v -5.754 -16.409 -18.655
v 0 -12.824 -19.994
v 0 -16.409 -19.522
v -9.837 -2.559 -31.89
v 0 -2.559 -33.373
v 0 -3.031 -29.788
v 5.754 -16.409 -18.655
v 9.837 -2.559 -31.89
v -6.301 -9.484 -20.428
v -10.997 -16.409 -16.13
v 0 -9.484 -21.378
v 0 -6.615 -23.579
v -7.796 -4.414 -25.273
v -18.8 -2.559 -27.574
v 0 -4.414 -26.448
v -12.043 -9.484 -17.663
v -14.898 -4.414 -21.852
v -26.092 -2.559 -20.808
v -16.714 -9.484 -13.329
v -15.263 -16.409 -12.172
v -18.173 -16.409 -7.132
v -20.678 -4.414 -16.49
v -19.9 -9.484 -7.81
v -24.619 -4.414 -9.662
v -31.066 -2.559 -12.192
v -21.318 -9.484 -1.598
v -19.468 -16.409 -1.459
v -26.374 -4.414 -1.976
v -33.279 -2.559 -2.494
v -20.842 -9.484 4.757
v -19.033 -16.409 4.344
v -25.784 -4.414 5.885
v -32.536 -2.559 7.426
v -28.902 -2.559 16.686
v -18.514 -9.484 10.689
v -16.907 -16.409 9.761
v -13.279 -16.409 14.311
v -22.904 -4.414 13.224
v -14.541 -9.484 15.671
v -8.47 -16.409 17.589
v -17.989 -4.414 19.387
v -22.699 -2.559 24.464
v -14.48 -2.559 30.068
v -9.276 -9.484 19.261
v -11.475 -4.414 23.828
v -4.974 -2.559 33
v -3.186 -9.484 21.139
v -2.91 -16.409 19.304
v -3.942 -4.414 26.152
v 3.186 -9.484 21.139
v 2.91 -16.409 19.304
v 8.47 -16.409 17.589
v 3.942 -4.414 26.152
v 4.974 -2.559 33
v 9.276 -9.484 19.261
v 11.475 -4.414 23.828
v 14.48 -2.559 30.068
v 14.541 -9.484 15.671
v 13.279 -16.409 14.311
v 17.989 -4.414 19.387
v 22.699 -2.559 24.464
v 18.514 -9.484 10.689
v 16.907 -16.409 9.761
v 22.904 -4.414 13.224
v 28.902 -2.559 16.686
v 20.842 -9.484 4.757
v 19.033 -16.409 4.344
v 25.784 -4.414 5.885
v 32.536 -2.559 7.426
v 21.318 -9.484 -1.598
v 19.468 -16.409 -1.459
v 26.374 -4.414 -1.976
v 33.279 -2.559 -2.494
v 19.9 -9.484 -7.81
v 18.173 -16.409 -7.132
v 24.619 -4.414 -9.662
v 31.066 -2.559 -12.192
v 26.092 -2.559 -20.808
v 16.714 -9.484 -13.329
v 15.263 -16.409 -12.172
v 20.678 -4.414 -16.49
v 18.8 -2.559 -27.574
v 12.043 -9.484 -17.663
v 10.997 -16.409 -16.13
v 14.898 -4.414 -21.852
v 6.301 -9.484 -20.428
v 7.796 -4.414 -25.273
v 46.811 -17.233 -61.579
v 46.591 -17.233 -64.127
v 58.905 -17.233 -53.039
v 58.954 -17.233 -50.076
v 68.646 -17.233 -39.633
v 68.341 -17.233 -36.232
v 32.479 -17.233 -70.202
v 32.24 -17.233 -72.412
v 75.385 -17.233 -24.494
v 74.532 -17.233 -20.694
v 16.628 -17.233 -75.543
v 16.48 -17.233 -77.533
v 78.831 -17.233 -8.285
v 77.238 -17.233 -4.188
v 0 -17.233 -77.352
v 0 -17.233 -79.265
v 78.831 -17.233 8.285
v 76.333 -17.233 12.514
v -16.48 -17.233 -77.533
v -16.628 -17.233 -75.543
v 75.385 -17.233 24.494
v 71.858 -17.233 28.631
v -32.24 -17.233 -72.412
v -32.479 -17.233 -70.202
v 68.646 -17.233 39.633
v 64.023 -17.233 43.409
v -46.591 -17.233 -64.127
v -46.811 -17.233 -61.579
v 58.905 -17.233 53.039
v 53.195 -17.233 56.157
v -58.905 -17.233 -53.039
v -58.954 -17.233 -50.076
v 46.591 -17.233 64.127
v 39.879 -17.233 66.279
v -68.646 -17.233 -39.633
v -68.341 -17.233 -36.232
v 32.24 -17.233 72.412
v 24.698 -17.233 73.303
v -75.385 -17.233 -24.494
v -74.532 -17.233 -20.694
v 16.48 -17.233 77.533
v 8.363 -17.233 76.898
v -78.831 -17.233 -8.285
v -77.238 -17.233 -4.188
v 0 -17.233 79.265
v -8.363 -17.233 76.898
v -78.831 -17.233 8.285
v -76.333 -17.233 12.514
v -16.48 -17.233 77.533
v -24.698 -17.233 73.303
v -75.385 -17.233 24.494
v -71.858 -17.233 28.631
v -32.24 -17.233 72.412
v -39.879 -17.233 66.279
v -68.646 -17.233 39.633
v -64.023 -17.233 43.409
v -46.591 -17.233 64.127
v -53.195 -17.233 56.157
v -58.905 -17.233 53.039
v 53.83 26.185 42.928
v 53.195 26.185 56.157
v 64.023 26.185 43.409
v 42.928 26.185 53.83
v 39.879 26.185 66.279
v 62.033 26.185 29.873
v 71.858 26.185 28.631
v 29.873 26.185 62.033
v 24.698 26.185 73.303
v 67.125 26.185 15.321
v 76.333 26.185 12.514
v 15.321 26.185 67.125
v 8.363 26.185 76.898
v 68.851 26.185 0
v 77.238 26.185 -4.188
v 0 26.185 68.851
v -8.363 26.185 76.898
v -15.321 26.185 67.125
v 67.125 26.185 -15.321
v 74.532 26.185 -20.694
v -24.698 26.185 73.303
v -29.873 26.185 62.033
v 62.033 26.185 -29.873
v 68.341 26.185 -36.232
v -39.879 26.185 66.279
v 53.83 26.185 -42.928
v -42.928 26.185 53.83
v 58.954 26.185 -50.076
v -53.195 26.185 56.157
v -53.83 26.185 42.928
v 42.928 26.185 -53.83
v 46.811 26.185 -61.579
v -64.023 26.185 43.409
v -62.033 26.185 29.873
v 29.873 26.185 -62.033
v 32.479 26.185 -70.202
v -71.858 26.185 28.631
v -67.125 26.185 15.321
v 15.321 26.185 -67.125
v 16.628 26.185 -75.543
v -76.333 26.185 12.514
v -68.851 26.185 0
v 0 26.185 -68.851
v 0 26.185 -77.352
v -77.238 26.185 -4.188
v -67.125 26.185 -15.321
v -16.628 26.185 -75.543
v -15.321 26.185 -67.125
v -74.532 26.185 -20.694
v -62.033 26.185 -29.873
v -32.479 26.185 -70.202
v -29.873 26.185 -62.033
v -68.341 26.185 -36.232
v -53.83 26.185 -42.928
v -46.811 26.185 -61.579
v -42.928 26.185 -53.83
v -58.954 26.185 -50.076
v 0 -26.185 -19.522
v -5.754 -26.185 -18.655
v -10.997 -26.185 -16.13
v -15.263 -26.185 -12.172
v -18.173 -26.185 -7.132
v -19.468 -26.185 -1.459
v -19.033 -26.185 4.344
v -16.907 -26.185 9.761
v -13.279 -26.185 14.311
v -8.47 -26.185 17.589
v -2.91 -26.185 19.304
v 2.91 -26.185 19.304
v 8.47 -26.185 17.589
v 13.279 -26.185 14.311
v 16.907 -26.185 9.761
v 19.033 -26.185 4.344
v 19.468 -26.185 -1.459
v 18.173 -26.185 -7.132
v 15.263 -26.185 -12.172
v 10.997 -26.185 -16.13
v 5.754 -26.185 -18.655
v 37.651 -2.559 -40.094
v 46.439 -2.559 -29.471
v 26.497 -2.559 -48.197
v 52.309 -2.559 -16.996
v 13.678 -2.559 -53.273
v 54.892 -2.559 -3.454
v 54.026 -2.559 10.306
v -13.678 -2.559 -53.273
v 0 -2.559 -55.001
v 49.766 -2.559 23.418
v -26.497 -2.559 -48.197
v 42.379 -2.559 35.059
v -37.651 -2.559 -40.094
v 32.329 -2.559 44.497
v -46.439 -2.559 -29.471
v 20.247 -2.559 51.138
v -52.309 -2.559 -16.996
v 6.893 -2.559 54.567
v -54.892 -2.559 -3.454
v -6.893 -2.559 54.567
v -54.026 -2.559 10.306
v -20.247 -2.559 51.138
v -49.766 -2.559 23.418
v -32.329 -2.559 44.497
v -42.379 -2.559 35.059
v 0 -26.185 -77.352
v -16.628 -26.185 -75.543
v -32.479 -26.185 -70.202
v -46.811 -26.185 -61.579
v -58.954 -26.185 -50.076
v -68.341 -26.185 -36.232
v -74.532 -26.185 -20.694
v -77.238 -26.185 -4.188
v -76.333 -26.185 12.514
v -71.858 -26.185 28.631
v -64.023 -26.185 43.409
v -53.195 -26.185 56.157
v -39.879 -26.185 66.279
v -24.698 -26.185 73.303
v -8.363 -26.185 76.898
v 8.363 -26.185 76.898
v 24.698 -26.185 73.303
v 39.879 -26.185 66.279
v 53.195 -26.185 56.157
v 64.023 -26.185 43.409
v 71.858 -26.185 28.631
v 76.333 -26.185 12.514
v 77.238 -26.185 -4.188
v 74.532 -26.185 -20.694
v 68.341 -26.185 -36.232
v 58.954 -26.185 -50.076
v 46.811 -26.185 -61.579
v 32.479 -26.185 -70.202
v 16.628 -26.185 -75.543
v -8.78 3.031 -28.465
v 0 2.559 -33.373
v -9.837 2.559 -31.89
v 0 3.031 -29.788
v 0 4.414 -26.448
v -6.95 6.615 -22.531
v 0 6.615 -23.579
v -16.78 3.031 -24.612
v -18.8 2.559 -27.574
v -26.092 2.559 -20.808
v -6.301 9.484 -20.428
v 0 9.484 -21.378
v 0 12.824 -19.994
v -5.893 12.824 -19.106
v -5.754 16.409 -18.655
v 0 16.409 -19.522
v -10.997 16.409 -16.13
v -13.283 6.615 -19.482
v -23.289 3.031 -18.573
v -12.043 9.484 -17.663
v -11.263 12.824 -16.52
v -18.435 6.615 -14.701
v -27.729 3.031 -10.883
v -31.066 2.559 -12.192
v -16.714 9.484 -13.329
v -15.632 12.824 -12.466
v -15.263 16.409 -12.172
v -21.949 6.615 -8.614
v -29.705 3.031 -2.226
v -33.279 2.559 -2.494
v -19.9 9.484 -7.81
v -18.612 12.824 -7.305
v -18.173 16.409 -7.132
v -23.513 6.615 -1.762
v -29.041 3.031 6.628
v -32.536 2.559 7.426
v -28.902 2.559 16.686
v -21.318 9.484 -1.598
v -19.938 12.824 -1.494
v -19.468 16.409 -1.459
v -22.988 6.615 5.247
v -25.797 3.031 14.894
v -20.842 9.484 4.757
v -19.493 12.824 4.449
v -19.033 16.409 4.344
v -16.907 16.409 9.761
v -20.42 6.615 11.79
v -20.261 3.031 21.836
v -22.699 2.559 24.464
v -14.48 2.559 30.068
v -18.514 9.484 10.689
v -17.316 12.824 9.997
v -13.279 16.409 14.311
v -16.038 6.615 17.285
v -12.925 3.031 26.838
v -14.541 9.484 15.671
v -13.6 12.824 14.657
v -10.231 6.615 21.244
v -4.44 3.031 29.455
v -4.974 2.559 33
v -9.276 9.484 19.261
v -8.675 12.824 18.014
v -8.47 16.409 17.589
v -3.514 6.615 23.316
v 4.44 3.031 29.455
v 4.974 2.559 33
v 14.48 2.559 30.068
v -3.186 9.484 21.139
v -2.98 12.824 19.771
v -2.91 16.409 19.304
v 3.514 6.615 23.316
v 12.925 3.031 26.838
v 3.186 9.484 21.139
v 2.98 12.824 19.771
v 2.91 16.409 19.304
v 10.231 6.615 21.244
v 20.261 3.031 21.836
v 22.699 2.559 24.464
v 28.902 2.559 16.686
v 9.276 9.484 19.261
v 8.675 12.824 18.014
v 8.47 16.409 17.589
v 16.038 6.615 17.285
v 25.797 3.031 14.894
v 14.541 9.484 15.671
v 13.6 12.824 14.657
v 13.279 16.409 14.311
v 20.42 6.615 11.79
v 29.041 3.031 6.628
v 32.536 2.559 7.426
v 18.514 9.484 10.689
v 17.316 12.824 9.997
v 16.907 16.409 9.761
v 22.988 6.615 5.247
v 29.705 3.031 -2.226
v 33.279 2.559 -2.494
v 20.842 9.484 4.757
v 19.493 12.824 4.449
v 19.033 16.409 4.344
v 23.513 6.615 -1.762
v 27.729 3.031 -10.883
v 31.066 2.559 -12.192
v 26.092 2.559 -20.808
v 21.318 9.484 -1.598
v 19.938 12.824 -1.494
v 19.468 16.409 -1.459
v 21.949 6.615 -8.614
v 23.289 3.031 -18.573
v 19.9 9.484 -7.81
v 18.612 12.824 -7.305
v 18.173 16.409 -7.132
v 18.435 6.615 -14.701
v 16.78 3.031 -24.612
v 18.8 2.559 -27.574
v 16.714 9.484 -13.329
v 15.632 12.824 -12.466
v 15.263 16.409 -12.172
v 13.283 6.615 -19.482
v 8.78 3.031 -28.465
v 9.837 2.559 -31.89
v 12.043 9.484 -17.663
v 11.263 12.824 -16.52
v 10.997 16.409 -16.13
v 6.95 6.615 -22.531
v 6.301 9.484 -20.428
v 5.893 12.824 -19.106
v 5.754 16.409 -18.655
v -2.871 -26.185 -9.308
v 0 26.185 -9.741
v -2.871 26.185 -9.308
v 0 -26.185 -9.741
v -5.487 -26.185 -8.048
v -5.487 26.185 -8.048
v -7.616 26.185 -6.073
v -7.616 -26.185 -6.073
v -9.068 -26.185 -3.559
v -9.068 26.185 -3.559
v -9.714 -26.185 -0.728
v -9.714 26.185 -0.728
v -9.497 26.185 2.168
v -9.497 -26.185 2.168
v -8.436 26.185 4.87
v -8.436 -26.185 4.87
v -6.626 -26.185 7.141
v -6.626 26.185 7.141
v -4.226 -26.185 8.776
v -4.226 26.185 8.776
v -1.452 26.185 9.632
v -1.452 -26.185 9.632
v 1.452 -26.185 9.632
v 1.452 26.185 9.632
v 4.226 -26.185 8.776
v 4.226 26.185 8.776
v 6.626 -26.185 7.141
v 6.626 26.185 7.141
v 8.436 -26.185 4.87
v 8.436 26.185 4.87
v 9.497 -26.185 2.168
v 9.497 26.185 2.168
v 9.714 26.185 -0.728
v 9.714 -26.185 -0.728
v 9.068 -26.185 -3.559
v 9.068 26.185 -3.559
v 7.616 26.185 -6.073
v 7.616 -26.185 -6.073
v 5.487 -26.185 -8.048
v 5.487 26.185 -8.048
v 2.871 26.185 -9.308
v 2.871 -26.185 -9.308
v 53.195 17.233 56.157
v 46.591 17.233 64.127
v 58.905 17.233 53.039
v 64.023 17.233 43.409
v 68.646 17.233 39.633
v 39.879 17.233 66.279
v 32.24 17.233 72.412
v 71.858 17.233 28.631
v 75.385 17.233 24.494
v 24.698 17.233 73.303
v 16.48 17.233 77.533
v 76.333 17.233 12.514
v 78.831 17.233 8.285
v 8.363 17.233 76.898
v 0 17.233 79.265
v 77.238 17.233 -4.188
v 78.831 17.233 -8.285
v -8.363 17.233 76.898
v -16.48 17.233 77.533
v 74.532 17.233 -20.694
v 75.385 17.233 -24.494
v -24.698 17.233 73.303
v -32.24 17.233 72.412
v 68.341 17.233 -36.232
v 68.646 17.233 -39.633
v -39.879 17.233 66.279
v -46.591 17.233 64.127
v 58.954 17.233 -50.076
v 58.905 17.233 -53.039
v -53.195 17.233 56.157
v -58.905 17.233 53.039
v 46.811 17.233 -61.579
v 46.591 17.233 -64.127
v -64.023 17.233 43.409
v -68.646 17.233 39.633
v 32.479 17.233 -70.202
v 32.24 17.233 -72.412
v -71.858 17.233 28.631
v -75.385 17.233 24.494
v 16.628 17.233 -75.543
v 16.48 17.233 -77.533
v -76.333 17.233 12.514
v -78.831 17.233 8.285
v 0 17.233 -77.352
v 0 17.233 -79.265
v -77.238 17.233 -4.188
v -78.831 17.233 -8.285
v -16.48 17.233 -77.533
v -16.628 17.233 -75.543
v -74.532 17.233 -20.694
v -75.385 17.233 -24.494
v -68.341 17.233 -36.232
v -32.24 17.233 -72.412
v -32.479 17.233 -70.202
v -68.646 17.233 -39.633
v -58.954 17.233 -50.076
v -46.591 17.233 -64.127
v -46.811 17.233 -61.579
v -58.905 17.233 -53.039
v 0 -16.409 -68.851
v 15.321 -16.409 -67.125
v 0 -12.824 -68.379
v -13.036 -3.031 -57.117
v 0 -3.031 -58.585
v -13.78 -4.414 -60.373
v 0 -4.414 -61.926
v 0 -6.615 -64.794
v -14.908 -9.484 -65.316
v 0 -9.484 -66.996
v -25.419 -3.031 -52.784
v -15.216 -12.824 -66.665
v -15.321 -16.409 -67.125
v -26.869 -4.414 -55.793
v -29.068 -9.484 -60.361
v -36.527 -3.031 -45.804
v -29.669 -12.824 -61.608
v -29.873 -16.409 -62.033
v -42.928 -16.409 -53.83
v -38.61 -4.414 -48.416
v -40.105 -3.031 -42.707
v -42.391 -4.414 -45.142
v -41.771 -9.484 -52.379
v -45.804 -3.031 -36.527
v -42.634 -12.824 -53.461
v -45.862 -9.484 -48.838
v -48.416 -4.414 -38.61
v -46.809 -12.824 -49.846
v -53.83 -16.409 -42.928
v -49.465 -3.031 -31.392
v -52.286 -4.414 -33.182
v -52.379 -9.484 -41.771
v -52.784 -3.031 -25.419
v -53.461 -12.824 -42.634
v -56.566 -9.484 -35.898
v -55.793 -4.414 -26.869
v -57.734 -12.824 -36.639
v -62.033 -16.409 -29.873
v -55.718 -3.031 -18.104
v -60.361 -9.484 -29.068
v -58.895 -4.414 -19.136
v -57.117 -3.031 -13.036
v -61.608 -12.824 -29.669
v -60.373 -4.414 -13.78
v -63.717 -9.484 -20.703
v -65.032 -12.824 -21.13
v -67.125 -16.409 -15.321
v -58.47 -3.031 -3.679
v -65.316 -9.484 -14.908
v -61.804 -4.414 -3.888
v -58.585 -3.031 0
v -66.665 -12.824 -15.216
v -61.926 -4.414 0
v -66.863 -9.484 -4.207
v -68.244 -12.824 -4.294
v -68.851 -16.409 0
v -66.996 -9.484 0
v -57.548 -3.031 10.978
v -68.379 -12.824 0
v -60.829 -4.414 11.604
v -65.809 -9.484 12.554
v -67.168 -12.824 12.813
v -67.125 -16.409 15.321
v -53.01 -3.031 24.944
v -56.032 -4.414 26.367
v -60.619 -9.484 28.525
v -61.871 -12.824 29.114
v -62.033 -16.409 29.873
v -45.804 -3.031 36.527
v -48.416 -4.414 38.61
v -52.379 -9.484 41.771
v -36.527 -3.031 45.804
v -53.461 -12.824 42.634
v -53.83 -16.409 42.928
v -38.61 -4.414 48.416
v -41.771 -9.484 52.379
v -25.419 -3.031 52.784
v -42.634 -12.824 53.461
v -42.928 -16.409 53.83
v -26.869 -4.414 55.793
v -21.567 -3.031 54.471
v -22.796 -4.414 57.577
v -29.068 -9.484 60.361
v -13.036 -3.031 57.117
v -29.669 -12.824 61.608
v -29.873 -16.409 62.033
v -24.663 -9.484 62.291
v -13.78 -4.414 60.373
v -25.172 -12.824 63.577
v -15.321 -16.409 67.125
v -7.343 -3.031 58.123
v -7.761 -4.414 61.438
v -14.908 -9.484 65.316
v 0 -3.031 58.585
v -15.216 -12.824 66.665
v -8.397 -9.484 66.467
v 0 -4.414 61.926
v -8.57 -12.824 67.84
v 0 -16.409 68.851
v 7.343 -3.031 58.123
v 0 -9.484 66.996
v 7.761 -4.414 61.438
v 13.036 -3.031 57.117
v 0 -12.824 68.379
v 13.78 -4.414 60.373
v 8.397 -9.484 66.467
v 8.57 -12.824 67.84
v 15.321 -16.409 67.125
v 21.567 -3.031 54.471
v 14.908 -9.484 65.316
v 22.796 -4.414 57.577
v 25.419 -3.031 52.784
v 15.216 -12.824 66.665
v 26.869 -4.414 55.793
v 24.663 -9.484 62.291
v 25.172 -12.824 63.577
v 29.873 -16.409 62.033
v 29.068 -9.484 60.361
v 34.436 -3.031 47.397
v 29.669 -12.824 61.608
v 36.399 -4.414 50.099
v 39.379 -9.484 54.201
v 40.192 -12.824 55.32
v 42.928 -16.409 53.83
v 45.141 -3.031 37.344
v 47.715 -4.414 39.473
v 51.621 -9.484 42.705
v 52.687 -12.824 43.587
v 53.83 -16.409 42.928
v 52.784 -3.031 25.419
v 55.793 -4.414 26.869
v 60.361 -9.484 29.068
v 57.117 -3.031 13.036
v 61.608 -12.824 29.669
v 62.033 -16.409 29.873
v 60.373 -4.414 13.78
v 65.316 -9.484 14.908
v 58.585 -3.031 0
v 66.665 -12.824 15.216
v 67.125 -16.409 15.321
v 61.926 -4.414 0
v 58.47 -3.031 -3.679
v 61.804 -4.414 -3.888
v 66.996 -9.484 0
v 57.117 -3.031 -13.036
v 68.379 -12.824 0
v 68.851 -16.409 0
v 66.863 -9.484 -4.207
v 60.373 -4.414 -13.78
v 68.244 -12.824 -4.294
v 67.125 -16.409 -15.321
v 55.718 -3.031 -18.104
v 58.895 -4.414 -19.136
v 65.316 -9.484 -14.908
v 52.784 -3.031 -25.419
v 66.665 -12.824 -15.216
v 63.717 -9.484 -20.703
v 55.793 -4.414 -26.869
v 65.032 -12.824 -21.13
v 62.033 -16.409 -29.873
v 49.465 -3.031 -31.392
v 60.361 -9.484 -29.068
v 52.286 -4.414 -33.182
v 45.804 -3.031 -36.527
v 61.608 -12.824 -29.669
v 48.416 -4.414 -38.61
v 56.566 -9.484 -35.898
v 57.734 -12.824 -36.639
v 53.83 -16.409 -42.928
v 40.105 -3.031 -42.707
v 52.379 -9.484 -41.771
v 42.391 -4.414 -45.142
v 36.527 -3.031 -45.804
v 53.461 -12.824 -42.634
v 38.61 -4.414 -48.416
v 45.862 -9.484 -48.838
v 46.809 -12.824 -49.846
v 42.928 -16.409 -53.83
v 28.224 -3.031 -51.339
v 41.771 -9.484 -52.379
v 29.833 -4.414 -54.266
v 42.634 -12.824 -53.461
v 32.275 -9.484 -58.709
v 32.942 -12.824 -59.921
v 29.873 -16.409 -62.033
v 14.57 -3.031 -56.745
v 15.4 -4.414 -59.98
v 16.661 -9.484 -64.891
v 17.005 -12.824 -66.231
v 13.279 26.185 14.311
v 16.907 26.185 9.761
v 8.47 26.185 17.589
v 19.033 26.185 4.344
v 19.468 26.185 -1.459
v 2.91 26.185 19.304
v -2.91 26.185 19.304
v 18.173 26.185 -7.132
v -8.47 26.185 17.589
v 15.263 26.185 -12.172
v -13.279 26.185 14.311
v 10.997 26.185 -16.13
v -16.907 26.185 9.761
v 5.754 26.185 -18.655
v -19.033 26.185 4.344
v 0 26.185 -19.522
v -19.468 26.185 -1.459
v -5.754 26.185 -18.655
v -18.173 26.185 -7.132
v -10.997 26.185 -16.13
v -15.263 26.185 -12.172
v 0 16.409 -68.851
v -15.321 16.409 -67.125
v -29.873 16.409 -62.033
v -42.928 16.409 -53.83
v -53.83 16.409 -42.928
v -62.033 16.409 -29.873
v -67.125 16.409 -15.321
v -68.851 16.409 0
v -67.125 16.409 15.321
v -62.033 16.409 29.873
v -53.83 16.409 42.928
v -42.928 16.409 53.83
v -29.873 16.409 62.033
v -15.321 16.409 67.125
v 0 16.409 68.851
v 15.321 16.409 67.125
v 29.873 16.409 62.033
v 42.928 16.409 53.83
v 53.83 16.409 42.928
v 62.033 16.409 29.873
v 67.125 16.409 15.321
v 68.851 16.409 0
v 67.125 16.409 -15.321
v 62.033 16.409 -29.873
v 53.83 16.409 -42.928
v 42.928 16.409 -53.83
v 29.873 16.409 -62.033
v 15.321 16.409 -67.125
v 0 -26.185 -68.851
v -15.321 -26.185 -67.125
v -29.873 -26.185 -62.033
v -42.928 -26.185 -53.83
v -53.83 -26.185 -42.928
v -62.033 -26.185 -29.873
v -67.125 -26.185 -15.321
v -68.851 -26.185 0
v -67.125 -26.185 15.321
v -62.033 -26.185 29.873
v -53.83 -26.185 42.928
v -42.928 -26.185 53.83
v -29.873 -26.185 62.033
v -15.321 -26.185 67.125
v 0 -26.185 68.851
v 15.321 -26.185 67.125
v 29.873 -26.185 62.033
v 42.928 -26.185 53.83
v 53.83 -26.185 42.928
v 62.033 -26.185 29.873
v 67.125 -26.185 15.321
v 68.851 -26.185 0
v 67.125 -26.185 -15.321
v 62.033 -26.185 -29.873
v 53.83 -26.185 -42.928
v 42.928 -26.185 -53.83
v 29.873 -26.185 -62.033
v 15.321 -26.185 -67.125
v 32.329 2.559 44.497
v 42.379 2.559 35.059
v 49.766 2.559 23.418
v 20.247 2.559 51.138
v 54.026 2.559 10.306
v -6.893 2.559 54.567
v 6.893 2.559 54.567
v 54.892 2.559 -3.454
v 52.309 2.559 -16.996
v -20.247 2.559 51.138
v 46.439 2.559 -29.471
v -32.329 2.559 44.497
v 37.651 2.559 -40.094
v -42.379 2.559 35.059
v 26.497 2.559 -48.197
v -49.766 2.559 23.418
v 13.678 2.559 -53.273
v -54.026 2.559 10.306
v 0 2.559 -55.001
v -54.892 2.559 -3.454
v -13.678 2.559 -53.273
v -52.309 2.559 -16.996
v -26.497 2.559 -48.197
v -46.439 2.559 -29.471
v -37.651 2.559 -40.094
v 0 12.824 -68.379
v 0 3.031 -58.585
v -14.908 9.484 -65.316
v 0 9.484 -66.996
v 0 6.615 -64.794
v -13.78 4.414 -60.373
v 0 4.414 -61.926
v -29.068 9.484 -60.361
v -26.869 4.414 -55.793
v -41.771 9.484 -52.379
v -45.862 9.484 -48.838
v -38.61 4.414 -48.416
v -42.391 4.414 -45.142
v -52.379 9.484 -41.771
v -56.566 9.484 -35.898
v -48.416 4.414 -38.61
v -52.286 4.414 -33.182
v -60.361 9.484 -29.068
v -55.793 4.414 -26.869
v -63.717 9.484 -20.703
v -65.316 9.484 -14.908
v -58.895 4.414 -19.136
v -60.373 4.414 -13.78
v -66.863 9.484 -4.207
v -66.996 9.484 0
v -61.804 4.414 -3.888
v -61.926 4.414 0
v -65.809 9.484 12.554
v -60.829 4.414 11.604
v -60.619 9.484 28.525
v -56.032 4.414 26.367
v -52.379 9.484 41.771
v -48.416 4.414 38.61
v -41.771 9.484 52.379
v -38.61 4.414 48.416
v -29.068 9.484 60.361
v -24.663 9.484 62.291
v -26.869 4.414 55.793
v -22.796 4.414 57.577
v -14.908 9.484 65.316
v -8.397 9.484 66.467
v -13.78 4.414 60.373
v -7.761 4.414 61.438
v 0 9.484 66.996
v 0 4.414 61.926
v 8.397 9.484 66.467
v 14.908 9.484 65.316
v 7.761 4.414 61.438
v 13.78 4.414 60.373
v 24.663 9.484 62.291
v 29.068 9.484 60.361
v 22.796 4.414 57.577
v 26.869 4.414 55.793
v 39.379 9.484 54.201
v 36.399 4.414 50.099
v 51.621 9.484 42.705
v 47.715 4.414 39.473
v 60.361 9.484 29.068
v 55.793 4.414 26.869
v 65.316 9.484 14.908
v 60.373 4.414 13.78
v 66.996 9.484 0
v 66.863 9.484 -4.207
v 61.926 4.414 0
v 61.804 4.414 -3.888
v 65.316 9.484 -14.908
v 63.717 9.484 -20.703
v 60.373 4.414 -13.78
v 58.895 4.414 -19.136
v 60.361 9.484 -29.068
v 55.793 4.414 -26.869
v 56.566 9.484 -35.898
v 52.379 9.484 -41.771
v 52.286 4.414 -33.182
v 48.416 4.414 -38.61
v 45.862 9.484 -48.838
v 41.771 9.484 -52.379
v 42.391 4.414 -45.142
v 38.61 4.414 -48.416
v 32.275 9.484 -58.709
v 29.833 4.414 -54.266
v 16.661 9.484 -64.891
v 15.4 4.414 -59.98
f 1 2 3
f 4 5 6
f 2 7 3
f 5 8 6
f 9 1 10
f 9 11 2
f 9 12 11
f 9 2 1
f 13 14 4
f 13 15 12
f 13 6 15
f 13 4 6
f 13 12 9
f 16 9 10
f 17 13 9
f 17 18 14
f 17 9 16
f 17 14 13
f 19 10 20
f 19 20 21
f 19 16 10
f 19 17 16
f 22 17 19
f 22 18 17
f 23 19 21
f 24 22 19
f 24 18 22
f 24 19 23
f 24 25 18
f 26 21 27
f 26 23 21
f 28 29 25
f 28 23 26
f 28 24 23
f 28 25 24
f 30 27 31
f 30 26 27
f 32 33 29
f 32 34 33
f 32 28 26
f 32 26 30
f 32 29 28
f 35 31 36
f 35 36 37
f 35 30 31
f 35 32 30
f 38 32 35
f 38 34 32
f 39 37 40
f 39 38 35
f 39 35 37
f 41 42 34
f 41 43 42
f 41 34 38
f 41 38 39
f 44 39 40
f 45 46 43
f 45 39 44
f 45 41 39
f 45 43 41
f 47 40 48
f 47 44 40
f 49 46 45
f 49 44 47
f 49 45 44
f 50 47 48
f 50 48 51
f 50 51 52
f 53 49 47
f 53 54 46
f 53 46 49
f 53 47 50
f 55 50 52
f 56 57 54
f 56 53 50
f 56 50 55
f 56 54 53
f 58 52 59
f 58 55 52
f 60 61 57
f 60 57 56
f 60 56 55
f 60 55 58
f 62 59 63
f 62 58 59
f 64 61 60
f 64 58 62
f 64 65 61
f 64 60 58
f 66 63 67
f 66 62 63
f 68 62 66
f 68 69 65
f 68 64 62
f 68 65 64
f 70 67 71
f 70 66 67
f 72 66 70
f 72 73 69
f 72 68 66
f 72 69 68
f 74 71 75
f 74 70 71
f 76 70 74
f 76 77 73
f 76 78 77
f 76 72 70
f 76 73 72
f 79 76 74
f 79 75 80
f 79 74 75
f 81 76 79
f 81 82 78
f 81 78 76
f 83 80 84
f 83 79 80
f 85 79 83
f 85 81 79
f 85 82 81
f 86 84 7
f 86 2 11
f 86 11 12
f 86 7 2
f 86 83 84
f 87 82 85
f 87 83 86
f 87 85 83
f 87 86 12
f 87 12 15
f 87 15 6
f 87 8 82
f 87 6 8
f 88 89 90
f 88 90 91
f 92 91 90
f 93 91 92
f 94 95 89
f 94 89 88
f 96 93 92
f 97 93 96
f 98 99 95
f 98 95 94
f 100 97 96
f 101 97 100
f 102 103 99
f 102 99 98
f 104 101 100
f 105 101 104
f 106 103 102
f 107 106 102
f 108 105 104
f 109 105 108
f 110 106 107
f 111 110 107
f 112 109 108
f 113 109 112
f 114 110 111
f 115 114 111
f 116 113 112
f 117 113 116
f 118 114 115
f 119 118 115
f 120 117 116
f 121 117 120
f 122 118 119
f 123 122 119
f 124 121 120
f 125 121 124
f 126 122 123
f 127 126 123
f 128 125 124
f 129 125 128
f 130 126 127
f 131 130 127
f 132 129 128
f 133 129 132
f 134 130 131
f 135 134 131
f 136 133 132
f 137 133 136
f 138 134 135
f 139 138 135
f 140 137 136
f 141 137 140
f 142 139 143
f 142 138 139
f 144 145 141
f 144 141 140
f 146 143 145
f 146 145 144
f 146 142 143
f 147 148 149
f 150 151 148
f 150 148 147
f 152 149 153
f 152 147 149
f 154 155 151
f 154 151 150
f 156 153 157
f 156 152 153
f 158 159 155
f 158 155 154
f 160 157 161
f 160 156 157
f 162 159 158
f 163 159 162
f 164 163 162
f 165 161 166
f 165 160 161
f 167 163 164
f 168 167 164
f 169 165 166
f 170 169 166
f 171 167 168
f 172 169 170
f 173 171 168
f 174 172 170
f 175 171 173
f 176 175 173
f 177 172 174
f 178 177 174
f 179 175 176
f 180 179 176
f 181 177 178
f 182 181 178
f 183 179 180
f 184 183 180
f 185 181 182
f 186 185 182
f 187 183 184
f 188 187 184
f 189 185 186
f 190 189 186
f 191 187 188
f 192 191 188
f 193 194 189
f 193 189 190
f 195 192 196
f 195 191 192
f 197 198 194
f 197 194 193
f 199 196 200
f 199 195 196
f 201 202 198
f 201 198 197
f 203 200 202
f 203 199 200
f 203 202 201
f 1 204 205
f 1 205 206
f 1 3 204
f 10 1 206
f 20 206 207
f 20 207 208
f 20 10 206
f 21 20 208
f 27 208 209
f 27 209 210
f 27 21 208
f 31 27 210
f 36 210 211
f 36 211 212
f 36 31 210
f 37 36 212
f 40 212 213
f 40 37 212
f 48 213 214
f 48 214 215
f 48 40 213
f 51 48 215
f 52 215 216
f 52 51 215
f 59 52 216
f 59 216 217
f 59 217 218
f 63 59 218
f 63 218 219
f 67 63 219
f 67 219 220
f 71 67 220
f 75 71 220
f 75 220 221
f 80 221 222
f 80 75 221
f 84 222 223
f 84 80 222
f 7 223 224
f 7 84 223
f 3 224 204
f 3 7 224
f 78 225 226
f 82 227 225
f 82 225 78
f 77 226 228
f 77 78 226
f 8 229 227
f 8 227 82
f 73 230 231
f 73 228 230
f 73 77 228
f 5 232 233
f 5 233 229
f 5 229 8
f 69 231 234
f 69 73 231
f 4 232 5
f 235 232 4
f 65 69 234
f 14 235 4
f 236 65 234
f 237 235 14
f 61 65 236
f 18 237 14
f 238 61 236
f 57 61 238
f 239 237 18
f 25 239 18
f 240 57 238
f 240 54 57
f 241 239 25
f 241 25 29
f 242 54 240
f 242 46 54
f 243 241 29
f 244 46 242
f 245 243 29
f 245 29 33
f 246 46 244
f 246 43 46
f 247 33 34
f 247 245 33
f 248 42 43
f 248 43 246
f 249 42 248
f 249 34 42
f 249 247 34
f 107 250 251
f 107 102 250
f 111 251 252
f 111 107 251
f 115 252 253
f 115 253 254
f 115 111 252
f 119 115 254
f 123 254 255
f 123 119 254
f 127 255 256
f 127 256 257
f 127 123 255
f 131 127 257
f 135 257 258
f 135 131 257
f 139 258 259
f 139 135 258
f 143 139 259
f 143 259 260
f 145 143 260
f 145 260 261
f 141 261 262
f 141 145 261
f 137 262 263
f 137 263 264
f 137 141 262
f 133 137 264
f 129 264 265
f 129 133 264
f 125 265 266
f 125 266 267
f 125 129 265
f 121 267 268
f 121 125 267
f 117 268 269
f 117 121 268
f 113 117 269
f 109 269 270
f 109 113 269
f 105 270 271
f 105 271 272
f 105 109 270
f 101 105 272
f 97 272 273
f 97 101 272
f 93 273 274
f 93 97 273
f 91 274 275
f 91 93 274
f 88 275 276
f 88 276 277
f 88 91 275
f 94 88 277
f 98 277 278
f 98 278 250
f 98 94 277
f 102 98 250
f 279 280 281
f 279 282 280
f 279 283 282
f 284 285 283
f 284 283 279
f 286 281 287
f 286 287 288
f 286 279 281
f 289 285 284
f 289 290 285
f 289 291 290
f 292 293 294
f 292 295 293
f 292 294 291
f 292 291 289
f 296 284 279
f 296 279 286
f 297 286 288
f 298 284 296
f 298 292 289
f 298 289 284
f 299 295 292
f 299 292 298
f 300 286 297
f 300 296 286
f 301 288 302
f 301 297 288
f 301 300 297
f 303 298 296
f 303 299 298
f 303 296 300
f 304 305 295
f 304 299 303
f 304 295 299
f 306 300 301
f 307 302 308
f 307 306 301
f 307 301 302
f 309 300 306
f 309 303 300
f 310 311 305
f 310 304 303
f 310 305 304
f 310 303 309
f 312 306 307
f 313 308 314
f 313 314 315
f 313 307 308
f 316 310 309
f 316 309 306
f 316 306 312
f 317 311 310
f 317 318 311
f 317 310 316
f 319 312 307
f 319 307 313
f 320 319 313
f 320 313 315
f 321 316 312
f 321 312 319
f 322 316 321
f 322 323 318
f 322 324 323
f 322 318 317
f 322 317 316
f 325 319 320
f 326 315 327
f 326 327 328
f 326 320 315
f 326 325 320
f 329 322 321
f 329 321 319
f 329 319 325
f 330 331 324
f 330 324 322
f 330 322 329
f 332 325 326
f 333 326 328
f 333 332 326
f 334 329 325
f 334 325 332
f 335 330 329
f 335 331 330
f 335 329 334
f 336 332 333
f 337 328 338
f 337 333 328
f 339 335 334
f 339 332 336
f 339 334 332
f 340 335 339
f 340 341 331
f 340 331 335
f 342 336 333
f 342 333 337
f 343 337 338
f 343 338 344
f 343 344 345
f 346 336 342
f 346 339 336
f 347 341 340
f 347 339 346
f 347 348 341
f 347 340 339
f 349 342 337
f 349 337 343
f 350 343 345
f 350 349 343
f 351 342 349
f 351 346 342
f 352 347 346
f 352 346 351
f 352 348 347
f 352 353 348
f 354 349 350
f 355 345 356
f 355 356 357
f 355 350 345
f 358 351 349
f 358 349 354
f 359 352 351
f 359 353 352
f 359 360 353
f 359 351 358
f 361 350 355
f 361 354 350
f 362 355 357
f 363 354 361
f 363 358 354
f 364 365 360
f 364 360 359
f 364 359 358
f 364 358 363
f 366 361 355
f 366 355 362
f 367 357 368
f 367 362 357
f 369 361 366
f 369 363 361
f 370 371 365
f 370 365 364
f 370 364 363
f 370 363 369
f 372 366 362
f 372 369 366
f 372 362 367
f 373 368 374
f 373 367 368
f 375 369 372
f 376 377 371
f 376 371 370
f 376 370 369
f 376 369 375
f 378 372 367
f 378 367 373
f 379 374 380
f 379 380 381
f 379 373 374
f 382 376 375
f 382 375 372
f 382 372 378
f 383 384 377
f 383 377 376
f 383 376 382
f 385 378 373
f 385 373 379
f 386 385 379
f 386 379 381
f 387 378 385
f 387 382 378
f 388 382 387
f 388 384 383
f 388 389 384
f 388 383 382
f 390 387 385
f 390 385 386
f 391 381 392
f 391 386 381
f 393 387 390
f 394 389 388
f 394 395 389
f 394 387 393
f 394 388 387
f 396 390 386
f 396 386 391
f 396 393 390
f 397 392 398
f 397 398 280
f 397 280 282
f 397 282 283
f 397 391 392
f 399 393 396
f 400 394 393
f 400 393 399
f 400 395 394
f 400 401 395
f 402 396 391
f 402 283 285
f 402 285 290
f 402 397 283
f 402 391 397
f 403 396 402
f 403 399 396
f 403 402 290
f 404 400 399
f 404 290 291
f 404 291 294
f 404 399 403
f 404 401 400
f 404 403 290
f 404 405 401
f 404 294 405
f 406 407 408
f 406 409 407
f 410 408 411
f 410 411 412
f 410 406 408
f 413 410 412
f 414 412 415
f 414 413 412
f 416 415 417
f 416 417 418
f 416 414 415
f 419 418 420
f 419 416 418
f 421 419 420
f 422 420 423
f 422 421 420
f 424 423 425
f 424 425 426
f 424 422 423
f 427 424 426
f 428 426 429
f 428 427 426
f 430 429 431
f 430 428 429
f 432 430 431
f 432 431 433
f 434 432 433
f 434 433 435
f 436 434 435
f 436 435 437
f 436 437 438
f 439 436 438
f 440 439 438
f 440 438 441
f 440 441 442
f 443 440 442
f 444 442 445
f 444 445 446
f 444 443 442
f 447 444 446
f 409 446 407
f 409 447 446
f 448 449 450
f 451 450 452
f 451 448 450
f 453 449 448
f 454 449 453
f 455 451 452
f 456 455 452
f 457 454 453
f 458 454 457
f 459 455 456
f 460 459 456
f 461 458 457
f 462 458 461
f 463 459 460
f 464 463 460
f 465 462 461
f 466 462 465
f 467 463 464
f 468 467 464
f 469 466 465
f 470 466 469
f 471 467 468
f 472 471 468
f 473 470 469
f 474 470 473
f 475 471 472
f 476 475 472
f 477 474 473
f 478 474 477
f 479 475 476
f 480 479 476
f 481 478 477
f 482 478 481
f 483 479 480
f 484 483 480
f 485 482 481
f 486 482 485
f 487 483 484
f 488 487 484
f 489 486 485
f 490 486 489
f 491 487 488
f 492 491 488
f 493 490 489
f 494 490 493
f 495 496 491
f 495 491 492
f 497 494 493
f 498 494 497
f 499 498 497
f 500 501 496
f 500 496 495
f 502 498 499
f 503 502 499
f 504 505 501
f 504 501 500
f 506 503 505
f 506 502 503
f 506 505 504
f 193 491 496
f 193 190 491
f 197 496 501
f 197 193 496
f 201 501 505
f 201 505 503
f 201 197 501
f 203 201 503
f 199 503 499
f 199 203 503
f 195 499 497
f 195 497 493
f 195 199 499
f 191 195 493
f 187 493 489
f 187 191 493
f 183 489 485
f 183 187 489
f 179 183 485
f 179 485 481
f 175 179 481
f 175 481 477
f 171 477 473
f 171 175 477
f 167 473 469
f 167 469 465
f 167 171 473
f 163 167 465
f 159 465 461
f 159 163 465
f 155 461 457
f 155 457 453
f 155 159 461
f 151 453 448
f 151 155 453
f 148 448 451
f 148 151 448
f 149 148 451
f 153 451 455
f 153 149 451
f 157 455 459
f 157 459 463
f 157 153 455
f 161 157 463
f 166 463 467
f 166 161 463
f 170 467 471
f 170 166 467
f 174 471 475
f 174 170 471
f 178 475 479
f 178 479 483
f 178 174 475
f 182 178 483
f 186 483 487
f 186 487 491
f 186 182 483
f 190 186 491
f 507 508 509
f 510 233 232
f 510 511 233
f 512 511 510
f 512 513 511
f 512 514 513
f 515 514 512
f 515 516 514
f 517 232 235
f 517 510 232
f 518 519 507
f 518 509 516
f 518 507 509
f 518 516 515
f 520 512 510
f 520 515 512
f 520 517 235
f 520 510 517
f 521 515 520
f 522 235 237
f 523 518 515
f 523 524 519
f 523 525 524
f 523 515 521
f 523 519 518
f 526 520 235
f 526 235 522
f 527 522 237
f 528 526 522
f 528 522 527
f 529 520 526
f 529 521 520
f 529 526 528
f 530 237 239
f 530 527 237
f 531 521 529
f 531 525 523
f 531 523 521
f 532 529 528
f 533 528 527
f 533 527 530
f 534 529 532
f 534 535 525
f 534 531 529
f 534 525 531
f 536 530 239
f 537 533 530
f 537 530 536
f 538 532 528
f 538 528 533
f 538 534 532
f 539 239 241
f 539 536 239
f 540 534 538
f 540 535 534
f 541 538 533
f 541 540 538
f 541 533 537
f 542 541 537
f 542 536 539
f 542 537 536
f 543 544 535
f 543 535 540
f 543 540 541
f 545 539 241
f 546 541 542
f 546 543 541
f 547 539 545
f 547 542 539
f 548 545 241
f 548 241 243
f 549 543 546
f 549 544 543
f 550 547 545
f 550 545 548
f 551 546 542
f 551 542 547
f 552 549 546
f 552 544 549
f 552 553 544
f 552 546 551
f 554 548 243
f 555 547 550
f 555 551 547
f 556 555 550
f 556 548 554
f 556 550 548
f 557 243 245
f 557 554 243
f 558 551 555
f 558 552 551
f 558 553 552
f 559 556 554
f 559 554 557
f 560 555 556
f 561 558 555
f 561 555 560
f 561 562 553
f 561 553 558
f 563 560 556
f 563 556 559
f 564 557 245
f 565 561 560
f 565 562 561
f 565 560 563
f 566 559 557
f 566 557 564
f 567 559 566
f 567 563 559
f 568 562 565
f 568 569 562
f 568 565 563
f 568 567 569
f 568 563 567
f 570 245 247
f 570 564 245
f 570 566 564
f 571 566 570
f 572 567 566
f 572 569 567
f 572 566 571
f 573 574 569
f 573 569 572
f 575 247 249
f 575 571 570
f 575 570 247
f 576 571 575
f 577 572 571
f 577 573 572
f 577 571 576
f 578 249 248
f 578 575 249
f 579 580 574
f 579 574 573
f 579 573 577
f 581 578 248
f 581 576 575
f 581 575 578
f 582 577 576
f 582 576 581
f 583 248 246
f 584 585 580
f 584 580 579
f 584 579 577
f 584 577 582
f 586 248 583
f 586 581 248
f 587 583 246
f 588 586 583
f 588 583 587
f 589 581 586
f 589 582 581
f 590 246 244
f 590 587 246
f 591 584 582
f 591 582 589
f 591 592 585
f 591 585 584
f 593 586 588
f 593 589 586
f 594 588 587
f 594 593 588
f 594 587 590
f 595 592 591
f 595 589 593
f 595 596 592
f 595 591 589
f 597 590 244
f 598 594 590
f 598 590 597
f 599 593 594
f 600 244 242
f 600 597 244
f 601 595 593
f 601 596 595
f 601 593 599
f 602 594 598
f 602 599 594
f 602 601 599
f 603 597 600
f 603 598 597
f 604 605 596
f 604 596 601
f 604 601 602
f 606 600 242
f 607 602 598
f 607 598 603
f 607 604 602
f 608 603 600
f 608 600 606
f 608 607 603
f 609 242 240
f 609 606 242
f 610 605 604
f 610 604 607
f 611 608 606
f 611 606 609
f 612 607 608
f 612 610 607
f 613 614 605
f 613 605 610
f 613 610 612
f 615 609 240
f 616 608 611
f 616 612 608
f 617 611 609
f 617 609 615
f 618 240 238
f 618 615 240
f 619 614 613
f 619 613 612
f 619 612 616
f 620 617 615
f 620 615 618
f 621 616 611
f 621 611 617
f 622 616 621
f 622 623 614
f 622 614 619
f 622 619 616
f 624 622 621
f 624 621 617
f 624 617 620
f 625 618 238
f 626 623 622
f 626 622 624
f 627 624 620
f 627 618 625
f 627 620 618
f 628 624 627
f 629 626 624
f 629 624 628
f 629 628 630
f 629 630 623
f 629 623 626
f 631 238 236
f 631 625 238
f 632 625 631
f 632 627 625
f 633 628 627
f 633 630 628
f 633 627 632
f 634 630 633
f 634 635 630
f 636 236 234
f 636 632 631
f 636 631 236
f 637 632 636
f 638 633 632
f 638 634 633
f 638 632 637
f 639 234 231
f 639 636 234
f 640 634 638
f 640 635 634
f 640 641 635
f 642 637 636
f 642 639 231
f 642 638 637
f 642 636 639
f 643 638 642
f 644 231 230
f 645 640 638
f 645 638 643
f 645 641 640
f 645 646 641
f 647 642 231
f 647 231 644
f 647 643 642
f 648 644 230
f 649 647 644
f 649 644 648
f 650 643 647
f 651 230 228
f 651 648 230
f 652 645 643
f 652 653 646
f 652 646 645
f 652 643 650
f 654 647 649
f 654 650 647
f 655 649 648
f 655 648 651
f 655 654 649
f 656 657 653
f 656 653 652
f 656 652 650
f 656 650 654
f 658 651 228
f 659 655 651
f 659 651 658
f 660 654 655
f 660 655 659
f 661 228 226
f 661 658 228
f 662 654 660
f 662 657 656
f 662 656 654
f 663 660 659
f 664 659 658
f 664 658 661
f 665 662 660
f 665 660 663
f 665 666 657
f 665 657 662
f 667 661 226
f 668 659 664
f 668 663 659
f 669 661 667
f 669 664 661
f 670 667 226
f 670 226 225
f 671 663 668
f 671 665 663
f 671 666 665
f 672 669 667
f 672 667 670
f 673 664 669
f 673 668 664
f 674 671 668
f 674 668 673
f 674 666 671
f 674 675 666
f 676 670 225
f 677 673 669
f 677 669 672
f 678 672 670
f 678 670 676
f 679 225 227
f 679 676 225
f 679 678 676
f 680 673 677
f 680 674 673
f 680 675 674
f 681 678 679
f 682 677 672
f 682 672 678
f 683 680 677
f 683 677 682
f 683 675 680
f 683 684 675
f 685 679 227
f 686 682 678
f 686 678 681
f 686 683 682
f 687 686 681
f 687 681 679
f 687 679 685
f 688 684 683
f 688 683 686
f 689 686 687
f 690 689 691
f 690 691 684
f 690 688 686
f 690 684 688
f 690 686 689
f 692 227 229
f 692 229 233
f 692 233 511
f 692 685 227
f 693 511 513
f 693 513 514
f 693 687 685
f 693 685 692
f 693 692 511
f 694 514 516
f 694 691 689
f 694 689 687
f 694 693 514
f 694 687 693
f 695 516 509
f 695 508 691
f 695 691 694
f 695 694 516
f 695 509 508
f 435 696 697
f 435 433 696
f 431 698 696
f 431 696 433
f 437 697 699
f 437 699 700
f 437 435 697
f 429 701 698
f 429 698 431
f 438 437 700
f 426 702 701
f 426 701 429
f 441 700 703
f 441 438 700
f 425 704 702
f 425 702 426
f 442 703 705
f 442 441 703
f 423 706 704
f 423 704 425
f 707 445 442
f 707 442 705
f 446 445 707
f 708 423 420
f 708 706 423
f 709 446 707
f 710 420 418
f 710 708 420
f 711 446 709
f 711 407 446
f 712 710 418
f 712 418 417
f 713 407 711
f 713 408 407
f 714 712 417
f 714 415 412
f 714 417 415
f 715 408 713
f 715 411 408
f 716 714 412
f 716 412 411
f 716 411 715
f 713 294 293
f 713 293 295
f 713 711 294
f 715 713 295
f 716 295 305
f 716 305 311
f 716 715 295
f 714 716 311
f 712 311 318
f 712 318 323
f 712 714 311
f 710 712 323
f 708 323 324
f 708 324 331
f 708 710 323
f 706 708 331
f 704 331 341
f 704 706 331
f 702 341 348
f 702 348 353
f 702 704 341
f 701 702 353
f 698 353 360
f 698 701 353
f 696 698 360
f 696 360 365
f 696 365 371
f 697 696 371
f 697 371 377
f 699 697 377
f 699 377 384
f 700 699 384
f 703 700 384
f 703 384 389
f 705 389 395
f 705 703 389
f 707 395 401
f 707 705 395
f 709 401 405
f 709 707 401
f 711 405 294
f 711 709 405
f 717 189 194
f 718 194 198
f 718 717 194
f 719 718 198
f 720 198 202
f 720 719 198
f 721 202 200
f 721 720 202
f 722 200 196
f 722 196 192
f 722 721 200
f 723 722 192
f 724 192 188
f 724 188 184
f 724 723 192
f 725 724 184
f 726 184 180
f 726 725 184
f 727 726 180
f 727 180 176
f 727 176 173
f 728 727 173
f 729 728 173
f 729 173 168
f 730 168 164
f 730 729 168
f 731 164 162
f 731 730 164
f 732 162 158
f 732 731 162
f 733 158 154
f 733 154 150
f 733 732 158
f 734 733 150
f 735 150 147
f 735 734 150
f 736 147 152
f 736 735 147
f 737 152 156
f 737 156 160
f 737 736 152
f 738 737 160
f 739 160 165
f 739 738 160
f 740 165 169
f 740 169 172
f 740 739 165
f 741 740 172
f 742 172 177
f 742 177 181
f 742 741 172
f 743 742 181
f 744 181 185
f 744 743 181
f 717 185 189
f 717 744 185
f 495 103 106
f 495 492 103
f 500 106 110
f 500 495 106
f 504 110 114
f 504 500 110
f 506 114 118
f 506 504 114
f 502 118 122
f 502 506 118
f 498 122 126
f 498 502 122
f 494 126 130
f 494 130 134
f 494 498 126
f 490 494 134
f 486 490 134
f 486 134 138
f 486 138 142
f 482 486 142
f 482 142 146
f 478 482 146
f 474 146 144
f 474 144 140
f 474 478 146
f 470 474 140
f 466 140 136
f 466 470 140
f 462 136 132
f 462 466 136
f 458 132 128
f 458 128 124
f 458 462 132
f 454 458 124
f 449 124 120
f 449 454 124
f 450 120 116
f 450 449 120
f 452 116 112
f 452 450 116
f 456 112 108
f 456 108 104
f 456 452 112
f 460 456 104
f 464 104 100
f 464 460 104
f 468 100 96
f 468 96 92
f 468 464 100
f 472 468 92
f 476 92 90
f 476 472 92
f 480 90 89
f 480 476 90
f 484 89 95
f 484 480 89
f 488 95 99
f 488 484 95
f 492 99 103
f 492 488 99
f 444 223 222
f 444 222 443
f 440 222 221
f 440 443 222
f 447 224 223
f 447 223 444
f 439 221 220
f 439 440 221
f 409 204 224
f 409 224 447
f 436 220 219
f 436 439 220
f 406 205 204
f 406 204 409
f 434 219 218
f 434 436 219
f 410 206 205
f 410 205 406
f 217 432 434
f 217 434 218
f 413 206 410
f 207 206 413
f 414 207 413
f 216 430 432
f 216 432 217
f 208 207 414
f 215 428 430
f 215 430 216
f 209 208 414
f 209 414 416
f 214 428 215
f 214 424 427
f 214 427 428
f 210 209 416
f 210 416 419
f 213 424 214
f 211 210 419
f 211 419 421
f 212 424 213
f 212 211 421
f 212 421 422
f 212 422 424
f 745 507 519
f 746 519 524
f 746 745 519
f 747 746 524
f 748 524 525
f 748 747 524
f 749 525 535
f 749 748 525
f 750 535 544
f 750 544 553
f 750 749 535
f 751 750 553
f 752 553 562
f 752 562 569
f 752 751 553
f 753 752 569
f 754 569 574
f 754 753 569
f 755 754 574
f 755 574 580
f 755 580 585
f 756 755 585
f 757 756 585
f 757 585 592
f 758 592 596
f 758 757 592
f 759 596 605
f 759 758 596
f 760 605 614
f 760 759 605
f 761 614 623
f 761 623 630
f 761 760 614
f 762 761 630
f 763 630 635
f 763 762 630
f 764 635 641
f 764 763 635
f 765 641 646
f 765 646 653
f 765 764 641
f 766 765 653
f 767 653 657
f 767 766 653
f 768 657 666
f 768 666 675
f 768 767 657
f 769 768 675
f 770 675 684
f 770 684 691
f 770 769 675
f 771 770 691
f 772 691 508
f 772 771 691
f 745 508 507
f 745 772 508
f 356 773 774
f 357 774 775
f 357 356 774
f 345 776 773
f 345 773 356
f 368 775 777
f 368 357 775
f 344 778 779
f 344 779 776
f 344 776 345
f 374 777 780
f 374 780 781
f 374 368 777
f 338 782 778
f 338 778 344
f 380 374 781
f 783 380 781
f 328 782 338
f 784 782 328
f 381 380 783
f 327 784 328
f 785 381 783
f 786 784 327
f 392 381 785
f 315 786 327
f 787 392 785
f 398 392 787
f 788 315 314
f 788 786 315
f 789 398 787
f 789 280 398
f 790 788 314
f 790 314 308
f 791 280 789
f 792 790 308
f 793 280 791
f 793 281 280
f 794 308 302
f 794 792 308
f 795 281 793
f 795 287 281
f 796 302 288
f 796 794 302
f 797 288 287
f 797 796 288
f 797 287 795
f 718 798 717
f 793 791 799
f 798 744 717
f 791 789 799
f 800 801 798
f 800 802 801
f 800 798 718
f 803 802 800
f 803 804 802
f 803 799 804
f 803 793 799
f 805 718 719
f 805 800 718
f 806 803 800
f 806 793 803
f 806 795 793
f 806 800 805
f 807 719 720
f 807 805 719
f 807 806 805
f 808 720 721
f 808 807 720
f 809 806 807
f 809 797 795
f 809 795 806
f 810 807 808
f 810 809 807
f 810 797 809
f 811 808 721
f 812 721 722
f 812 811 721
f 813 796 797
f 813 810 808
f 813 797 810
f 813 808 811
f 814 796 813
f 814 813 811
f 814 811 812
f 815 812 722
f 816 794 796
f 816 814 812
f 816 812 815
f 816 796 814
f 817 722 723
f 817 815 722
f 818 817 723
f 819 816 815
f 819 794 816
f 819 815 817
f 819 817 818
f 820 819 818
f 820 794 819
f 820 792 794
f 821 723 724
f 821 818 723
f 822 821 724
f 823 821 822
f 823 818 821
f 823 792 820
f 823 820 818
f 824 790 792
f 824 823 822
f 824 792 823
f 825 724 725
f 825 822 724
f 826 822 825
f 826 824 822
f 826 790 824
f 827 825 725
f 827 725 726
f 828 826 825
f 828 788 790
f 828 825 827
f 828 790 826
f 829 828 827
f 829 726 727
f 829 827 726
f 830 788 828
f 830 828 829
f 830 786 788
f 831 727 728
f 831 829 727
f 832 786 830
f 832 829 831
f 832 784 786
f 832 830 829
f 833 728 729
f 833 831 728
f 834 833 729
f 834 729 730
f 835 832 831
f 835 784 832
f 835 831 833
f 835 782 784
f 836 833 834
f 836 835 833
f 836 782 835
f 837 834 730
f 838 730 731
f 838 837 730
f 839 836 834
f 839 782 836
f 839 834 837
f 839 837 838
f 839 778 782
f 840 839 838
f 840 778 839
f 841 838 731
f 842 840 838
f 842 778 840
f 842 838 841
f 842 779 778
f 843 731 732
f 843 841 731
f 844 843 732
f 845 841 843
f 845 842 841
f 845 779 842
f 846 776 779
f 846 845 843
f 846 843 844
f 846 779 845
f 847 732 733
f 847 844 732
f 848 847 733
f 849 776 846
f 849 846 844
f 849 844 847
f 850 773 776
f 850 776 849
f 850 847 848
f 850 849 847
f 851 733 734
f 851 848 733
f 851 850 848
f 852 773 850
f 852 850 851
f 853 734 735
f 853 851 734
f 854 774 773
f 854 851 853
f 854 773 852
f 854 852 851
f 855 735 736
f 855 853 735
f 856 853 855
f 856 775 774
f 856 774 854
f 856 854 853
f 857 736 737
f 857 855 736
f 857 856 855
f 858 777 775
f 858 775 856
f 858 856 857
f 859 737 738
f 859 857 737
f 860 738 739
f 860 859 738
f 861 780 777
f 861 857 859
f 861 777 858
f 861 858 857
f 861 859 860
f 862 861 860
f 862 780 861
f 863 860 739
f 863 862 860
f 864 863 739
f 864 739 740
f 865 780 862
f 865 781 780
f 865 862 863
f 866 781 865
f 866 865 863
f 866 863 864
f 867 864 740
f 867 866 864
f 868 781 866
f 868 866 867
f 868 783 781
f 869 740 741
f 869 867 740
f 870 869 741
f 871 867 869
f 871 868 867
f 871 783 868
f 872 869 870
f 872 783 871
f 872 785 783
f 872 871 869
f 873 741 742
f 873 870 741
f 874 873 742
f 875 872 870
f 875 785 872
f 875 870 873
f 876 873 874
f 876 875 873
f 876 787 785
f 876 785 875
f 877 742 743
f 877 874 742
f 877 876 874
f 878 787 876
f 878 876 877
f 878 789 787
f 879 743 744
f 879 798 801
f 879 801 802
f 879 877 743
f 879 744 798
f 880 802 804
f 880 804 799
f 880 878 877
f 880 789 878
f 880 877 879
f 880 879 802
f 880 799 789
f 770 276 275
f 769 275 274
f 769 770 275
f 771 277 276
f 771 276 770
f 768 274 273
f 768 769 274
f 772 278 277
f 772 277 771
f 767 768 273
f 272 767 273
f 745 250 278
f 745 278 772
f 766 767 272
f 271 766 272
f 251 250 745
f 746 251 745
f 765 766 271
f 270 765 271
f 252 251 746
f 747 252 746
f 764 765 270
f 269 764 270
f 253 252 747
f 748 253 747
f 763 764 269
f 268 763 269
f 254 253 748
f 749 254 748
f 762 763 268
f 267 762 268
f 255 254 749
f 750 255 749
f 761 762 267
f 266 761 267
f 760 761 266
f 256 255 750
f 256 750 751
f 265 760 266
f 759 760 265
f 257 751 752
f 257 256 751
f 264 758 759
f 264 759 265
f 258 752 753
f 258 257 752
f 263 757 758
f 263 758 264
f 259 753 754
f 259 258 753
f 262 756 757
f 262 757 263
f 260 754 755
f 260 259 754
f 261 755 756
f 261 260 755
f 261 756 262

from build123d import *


with BuildPart() as part:
    # Sketch1 → Revolve1 (revolve)
    with BuildSketch(Plane.XY, mode=Mode.PRIVATE) as revolve1_sk:
        with BuildLine():
            Line((-9.740947322, 26.185345129), (-9.740947322, -26.185345129))
            Line((-9.740947322, -26.185345129), (-19.522320179, -26.185345129))
            Line((-19.522320179, -26.185345129), (-19.522320179, -16.409199987))
            ThreePointArc((-19.522320179, -16.409199987), (-23.579011192, -6.615481526), (-33.372729652, -2.558790514))
            Line((-33.372729652, -2.558790514), (-55.000709219, -2.558790514))
            ThreePointArc((-55.000709219, -2.558790514), (-64.79442768, -6.615481526), (-68.851118692, -16.409199987))
            Line((-68.851118692, -16.409199987), (-68.851118692, -26.185345129))
            Line((-68.851118692, -26.185345129), (-77.3516349, -26.185345129))
            Line((-77.3516349, -26.185345129), (-77.3516349, -17.373618967))
            Line((-77.3516349, -17.373618967), (-77.3516349, -17.233064019))
            Line((-77.3516349, -17.233064019), (-79.265002978, -17.233064019))
            Line((-79.265002978, -17.233064019), (-79.265002978, 17.233064019))
            Line((-79.265002978, 17.233064019), (-77.3516349, 17.233064019))
            Line((-77.3516349, 17.233064019), (-77.3516349, 17.373618967))
            Line((-77.3516349, 17.373618967), (-77.3516349, 26.185345129))
            Line((-77.3516349, 26.185345129), (-68.851118692, 26.185345129))
            Line((-68.851118692, 26.185345129), (-68.851118692, 16.409199987))
            ThreePointArc((-68.851118692, 16.409199987), (-64.79442768, 6.615481526), (-55.000709219, 2.558790514))
            Line((-55.000709219, 2.558790514), (-33.372729652, 2.558790514))
            ThreePointArc((-33.372729652, 2.558790514), (-23.579011192, 6.615481526), (-19.522320179, 16.409199987))
            Line((-19.522320179, 16.409199987), (-19.522320179, 26.185345129))
            Line((-19.522320179, 26.185345129), (-9.740947322, 26.185345129))
        make_face()
    revolve(revolve1_sk.sketch.rotate(Axis((0, 0, 0), (0, 1, 0)), 270), axis=Axis((0, 0, 0), (0, 1, 0)))


solid = part.part
